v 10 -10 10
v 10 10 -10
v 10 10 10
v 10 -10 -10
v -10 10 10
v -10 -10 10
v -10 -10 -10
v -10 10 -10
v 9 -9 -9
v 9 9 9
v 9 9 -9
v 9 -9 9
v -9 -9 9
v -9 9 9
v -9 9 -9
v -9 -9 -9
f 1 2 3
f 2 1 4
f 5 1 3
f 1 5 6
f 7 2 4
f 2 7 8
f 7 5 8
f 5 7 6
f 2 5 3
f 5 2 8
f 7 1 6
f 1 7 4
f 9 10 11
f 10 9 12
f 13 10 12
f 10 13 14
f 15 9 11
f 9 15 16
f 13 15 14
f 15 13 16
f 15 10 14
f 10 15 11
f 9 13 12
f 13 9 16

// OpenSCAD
//This is my first attempt at designing something in OpenSCAD and is made to replace the FreeCAD export that I had, because it was difficult to modify. 
//Designed by Kyle Randall
//////////////////////////////////////////////////
//Edit the parameters below to modify the outer dimensions of your hollow calibration cube; it will still remain hollow, but you can adjust the wall thickness.

X=20.0;//this is X-axis length (left-right)
Y=20.0;//this is the Y-axis (forward-back)
Z=20.0;// this is the Z-axis (up-down)
Wall_Thickness=1.0;//wall thickness in mm
//don't edit the code below unless you know what you're doing

module thing()
{
	difference(){
		cube([X,Y,Z], center = true);
		cube([X-Wall_Thickness*2,Y-Wall_Thickness*2,Z-Wall_Thickness*2],center=true);//the size of the inner cube
	
	}
}
thing();
